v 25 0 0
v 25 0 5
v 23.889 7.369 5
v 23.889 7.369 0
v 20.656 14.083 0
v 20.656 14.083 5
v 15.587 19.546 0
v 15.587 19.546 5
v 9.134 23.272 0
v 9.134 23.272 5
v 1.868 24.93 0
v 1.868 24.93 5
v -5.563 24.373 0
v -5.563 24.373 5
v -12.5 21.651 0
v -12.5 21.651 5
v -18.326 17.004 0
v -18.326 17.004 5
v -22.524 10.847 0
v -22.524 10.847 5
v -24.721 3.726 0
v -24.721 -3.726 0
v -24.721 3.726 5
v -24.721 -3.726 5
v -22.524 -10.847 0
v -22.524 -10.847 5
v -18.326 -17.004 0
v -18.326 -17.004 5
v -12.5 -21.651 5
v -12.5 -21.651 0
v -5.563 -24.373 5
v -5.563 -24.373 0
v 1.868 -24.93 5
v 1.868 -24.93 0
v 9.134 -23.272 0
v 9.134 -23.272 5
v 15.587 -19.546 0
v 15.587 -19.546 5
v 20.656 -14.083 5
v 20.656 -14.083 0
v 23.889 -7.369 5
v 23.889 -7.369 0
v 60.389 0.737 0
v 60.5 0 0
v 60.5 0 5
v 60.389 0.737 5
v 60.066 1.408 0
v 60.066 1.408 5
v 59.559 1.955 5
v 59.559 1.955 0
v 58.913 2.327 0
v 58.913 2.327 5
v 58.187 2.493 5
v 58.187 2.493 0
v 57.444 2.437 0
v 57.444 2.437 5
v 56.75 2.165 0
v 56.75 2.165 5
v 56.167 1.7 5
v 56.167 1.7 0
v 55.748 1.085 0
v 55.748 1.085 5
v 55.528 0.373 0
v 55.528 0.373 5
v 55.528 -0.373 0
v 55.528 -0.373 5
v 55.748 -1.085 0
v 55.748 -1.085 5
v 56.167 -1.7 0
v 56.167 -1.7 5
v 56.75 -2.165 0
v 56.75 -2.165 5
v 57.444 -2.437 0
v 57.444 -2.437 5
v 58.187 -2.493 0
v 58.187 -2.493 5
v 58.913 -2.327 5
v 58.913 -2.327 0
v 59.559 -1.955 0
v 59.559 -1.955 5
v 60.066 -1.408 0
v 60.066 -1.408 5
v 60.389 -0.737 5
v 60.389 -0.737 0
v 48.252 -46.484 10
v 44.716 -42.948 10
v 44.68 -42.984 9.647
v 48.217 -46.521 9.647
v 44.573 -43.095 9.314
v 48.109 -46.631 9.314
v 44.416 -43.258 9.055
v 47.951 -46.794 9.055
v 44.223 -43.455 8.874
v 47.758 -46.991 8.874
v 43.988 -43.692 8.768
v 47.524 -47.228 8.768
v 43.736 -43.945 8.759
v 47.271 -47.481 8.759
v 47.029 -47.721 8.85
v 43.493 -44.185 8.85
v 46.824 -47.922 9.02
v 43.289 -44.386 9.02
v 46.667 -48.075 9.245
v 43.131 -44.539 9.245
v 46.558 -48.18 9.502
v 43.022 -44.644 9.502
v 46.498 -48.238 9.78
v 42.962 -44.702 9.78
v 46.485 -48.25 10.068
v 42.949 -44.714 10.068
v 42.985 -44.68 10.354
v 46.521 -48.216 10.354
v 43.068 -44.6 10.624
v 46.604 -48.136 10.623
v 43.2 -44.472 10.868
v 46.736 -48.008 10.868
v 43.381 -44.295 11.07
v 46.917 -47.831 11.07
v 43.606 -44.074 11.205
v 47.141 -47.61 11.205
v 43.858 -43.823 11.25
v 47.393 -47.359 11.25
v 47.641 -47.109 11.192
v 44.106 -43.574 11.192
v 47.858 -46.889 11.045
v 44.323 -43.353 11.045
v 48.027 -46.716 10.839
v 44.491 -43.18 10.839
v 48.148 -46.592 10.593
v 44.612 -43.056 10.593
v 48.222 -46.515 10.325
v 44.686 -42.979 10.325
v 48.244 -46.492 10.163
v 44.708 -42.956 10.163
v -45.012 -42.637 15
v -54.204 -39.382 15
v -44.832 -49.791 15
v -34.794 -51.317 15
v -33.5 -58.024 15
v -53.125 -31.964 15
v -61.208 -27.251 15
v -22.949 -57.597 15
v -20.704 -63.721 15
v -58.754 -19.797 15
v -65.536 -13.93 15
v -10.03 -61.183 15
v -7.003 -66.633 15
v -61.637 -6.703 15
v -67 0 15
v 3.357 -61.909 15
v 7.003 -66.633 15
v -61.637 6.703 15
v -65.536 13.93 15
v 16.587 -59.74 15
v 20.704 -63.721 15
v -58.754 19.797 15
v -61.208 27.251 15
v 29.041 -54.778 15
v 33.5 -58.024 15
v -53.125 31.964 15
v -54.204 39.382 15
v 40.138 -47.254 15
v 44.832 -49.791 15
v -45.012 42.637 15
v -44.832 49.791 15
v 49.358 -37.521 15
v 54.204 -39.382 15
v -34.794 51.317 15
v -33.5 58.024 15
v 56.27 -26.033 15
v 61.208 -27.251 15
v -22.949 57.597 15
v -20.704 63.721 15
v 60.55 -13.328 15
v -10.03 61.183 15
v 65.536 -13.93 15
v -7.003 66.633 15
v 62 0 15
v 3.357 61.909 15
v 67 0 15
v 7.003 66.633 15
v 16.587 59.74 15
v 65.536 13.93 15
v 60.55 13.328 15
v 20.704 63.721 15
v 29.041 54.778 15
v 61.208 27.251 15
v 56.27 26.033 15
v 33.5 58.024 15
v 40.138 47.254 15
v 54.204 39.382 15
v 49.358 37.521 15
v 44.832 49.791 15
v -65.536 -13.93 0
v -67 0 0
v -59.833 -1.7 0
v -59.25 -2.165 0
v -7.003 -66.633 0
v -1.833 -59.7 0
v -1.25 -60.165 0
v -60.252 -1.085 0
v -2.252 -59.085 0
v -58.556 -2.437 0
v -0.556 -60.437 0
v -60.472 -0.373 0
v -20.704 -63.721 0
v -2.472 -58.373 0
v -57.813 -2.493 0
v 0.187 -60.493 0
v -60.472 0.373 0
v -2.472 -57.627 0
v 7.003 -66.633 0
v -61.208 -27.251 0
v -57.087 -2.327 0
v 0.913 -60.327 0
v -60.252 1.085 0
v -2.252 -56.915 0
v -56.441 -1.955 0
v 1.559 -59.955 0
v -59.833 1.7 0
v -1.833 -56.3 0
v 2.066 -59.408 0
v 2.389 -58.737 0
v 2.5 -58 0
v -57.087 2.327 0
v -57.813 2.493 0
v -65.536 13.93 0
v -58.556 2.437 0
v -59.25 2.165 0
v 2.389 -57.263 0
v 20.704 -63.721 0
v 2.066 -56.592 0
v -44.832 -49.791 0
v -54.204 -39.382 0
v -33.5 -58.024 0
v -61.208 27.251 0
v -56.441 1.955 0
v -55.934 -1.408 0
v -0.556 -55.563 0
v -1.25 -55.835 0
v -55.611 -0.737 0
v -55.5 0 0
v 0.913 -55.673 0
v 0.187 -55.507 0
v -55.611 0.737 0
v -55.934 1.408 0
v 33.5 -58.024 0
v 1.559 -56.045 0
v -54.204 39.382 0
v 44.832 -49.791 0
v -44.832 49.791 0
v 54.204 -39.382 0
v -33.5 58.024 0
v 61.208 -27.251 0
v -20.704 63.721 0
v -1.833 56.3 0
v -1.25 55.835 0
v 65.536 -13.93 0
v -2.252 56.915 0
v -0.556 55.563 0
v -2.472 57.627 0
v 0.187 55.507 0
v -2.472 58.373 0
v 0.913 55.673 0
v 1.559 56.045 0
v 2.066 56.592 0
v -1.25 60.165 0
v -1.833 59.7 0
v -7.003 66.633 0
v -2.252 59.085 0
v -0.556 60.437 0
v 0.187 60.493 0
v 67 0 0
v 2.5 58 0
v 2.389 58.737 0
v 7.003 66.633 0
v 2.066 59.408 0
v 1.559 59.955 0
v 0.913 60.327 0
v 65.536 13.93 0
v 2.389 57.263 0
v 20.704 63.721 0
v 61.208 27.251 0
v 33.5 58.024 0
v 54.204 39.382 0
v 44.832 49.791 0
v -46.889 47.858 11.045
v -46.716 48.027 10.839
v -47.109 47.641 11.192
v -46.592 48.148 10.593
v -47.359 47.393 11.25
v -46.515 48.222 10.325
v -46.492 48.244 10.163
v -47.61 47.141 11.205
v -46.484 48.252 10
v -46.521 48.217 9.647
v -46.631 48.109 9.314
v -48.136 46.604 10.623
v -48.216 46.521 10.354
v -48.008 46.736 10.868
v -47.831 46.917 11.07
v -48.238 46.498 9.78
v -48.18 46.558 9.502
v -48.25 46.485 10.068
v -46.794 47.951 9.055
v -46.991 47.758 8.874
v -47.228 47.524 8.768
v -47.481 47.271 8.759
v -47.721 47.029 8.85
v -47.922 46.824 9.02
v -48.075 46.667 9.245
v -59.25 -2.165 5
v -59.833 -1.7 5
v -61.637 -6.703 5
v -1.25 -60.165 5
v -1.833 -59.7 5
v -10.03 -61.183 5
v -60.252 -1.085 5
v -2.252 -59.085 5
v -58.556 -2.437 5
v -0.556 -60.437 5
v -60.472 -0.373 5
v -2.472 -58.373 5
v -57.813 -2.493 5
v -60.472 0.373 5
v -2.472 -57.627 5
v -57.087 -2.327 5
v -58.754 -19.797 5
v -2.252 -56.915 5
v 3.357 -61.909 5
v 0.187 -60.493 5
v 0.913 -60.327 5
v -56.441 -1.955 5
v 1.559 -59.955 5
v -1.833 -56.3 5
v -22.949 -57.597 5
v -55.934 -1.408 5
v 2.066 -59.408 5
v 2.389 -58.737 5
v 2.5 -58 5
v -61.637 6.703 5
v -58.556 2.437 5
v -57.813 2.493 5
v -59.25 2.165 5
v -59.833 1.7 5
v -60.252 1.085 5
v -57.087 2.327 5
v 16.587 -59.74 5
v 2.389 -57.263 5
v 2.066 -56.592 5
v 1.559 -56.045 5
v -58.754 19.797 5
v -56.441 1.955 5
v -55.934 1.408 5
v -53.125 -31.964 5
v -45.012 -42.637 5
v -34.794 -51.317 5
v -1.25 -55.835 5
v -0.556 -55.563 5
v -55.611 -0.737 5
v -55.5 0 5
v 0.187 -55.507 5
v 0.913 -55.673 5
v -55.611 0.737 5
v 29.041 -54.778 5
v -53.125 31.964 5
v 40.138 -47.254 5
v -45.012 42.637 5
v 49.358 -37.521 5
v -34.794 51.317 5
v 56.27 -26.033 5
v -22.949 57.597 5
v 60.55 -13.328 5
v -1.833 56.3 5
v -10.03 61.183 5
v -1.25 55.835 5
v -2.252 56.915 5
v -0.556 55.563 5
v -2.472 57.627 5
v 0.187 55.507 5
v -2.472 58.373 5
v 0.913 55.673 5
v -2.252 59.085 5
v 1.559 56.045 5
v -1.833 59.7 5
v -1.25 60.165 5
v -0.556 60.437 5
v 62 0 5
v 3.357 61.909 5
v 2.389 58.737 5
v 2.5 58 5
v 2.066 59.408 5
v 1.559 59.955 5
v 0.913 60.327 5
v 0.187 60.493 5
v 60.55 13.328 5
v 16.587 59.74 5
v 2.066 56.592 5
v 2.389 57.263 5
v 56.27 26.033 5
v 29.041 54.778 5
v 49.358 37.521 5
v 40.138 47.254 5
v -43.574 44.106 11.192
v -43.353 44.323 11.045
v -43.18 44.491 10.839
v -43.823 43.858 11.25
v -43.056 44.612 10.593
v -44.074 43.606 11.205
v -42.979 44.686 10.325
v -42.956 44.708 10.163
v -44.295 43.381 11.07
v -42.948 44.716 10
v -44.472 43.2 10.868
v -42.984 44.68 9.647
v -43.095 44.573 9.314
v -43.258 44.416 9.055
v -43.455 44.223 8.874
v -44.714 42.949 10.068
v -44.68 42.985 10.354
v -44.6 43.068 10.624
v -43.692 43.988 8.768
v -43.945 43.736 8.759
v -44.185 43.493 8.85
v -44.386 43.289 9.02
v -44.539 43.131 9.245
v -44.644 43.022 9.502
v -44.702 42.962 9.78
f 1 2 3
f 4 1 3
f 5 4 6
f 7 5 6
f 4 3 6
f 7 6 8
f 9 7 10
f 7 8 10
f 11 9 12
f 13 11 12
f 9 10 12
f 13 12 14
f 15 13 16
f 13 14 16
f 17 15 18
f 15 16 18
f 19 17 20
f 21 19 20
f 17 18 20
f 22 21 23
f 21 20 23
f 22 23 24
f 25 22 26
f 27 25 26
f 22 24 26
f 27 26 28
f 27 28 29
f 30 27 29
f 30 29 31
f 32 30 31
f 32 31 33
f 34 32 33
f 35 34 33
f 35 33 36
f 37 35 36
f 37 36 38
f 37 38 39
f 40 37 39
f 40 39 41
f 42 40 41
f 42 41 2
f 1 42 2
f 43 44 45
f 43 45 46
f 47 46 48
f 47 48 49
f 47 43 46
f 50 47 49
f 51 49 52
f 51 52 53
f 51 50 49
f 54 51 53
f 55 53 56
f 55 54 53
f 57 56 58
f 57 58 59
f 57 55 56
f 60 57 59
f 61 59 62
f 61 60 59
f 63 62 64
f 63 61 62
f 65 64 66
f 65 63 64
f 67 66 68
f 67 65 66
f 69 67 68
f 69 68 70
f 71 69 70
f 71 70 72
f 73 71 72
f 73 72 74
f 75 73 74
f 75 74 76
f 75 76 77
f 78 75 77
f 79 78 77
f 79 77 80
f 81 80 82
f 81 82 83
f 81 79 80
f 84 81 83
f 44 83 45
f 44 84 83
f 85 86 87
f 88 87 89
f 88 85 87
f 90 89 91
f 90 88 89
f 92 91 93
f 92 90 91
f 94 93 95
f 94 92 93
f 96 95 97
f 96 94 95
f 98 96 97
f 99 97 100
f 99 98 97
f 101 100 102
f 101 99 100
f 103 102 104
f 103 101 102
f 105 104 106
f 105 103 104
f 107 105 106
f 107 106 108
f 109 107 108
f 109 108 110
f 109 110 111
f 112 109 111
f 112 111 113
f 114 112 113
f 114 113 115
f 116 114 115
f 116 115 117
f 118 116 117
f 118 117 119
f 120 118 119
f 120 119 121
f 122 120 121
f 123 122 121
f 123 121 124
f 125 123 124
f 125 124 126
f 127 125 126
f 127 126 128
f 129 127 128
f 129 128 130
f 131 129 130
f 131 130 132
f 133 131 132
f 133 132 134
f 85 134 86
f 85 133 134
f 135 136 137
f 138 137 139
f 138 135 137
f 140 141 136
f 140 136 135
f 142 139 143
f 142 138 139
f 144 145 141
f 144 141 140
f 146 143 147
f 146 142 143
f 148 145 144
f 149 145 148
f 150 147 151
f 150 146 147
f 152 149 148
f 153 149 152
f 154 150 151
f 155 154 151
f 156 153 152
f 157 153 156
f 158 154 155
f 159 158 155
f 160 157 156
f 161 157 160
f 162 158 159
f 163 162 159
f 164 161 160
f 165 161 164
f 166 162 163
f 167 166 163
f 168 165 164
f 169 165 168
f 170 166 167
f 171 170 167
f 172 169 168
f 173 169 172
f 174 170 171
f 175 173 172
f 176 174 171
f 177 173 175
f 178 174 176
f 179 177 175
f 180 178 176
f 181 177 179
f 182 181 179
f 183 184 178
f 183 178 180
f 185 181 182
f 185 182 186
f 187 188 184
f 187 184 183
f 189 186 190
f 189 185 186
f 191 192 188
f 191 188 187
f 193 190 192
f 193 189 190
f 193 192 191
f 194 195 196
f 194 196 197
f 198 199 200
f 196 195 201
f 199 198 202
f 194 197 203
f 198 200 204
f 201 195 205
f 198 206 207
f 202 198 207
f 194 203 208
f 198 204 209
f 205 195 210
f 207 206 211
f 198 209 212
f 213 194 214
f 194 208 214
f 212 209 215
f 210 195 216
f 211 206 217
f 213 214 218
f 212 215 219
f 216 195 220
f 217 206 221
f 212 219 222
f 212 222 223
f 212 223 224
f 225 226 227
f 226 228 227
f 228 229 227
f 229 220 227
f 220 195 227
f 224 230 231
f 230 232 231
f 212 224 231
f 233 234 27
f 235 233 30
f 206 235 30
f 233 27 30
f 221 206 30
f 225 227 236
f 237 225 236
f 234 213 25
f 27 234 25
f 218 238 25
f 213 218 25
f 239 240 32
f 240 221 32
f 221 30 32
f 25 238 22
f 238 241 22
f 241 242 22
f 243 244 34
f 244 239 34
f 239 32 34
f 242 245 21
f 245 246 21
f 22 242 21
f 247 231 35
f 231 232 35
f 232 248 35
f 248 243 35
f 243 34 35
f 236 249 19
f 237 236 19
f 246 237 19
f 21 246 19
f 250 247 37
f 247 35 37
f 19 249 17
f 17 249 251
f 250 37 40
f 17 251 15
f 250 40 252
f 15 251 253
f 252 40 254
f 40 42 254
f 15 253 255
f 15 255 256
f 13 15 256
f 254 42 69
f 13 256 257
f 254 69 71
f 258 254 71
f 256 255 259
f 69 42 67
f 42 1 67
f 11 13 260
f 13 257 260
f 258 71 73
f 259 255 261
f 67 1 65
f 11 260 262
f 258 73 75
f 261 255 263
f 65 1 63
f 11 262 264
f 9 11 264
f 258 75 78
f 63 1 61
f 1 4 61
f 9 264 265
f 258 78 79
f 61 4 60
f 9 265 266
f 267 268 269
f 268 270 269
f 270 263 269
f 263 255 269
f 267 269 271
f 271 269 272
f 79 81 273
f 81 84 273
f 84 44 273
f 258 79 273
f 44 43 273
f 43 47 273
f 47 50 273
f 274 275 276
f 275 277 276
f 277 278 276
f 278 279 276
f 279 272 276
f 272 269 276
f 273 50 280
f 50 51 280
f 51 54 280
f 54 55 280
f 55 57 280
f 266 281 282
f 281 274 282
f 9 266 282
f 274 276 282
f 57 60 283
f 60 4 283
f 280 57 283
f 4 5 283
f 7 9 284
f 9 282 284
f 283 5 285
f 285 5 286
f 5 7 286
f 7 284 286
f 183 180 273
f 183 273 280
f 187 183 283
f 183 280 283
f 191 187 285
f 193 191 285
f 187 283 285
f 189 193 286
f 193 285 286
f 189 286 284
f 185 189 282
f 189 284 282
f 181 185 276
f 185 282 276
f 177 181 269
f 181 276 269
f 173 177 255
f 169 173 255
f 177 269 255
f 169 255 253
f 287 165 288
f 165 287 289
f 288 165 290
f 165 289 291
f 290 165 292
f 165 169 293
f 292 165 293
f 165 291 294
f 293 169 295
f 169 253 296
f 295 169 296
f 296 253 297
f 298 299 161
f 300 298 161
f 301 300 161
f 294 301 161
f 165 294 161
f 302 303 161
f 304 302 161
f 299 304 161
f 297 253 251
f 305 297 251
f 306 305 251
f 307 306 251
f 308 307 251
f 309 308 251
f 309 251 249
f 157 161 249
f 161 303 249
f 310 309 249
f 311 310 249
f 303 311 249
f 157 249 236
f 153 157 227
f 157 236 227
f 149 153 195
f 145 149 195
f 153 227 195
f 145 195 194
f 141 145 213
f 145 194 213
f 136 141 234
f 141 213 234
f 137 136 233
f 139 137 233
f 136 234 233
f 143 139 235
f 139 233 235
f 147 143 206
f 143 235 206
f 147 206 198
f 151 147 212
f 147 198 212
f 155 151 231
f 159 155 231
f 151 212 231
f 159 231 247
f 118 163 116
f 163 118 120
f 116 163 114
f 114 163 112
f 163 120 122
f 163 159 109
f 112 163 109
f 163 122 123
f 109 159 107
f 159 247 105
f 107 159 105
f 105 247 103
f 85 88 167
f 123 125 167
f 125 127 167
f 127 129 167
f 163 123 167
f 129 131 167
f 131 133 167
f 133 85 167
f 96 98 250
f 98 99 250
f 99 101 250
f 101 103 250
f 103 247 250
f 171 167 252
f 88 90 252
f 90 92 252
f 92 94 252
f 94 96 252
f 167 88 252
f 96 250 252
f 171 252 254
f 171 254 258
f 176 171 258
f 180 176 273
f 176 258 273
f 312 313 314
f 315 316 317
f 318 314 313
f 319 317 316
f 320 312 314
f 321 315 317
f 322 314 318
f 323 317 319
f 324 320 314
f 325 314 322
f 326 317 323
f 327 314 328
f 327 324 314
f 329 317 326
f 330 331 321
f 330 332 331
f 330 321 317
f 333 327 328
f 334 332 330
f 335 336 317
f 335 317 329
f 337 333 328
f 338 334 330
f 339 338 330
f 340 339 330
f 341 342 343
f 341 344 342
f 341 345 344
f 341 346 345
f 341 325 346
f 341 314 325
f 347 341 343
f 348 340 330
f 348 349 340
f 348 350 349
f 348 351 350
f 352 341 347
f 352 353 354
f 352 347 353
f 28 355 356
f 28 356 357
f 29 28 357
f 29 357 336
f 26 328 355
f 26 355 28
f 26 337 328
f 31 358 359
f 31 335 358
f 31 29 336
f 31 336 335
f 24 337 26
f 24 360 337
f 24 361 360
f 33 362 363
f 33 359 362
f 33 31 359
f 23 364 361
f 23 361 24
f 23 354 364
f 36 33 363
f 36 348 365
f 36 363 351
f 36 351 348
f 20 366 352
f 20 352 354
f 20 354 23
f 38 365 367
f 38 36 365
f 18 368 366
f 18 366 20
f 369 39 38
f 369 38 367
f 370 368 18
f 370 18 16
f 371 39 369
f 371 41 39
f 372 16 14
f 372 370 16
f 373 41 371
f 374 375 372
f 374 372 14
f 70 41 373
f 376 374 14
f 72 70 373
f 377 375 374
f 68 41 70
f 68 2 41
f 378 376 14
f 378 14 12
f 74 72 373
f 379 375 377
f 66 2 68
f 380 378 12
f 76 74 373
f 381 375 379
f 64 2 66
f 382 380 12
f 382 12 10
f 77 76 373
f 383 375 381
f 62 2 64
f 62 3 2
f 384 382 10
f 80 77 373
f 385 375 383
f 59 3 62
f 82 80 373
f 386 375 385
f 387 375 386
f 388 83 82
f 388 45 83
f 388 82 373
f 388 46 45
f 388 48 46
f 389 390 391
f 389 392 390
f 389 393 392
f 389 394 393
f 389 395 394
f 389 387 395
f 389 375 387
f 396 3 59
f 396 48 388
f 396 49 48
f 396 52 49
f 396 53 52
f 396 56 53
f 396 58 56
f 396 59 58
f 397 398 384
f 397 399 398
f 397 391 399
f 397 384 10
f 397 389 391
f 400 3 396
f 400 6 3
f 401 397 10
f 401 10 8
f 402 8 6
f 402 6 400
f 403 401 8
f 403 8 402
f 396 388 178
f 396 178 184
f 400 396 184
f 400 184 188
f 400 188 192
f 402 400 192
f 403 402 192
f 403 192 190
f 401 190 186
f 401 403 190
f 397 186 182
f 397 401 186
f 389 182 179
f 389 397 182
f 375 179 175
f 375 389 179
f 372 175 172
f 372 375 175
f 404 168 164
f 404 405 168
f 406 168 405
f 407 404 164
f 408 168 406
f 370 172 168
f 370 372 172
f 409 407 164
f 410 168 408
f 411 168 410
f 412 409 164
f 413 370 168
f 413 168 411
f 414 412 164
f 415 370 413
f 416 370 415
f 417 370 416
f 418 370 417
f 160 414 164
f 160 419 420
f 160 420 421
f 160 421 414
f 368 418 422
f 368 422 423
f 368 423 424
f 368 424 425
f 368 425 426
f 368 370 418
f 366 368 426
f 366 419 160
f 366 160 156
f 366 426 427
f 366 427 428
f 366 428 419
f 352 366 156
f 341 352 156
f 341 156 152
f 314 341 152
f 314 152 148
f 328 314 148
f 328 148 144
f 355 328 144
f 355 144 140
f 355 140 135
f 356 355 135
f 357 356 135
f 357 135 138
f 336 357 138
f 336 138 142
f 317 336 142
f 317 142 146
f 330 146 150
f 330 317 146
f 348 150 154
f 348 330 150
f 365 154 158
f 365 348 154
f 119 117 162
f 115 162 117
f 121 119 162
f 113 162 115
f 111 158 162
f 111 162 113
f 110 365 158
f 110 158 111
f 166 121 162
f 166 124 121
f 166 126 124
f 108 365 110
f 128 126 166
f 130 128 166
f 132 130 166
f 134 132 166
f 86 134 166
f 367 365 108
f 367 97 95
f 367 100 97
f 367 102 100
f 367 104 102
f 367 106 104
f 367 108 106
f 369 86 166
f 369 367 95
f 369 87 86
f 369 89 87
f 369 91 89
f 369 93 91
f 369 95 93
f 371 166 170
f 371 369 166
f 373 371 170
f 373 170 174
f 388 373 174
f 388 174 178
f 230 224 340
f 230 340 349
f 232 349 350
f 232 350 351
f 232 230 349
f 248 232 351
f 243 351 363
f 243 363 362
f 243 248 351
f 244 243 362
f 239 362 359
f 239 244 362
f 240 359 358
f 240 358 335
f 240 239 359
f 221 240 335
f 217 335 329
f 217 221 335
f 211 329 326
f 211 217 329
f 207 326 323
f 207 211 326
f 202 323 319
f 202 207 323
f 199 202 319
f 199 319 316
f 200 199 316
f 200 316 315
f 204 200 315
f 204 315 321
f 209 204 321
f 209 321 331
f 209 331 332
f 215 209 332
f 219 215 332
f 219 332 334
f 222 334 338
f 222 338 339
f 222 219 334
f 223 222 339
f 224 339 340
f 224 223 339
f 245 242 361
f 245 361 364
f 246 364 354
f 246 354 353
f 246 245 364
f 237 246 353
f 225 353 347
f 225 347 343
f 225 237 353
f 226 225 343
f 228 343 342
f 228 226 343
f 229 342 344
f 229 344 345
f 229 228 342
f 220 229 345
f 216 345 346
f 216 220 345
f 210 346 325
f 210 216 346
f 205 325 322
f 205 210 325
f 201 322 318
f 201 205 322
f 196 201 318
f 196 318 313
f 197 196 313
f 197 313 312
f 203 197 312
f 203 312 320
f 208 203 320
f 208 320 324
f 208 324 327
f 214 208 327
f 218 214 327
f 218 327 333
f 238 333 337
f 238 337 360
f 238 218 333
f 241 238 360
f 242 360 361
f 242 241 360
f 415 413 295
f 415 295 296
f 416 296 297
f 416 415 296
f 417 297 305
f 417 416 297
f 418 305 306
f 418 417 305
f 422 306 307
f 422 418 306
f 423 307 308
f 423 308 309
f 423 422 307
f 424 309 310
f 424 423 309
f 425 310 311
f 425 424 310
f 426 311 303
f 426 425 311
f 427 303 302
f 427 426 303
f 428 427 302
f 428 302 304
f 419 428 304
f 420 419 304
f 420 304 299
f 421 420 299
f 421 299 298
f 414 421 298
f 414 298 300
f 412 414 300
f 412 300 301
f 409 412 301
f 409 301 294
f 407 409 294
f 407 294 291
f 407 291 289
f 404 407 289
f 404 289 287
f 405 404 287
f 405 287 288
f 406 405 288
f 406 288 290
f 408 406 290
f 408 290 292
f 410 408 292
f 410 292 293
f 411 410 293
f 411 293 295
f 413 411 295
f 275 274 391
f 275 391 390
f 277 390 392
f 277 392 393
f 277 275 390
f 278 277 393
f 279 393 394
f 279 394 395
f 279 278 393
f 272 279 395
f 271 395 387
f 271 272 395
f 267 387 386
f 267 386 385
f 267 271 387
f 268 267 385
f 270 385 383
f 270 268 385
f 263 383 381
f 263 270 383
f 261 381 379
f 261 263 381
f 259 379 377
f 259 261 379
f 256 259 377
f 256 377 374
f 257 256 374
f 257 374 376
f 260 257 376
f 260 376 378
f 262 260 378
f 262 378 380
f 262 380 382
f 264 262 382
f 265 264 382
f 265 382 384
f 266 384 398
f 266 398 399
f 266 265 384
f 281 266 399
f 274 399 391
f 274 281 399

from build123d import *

# Parameters (mm, degrees)
SKETCH1_R               = 67
SKETCH1_R_2             = 2.5
BOSS_EXTRUDE1_DEPTH     = 5
SKETCH3_R               = 25
CUT_EXTRUDE1_DEPTH      = 10
SKETCH4_R               = 67
SKETCH4_R_2             = 62
BOSS_EXTRUDE2_DEPTH     = 10
CUT_EXTRUDE4_DEPTH      = 121
CUT_EXTRUDE4_DEPTH_BACK = 121
SKETCH7_R               = 1.25


with BuildPart() as part:
    # Sketch1 → Boss-Extrude1 (new body)
    with BuildSketch(Plane.XY):
        Circle(SKETCH1_R)
        with Locations((0, 58)):
            Circle(SKETCH1_R_2, mode=Mode.SUBTRACT)
        with Locations((58, 0)):
            Circle(SKETCH1_R_2, mode=Mode.SUBTRACT)
        with Locations((0, -58)):
            Circle(SKETCH1_R_2, mode=Mode.SUBTRACT)
        with Locations((-58, 0)):
            Circle(SKETCH1_R_2, mode=Mode.SUBTRACT)
    extrude(amount=BOSS_EXTRUDE1_DEPTH)

    # Sketch3 → Cut-Extrude1 (cut)
    with BuildSketch(Plane.XY.offset(5)):
        Circle(SKETCH3_R)
    extrude(amount=-CUT_EXTRUDE1_DEPTH, mode=Mode.SUBTRACT)

    # Sketch4 → Boss-Extrude2 (add)
    with BuildSketch(Plane.XY.offset(5)):
        Circle(SKETCH4_R)
        Circle(SKETCH4_R_2, mode=Mode.SUBTRACT)
    extrude(amount=BOSS_EXTRUDE2_DEPTH)

    # Sketch7 → Cut-Extrude4 (cut, two sides: drawn at the far end of the back side and taken through both)
    with BuildSketch(Plane(origin=(0, 0, 0), x_dir=(0.7071067811865477, 0.7071067811865475, 0), z_dir=(-0.7071067811865475, 0.7071067811865477, 0)).offset(-CUT_EXTRUDE4_DEPTH_BACK)):
        with Locations((0, -10)):
            Circle(SKETCH7_R)
    extrude(amount=CUT_EXTRUDE4_DEPTH + CUT_EXTRUDE4_DEPTH_BACK, mode=Mode.SUBTRACT)


solid = part.part
